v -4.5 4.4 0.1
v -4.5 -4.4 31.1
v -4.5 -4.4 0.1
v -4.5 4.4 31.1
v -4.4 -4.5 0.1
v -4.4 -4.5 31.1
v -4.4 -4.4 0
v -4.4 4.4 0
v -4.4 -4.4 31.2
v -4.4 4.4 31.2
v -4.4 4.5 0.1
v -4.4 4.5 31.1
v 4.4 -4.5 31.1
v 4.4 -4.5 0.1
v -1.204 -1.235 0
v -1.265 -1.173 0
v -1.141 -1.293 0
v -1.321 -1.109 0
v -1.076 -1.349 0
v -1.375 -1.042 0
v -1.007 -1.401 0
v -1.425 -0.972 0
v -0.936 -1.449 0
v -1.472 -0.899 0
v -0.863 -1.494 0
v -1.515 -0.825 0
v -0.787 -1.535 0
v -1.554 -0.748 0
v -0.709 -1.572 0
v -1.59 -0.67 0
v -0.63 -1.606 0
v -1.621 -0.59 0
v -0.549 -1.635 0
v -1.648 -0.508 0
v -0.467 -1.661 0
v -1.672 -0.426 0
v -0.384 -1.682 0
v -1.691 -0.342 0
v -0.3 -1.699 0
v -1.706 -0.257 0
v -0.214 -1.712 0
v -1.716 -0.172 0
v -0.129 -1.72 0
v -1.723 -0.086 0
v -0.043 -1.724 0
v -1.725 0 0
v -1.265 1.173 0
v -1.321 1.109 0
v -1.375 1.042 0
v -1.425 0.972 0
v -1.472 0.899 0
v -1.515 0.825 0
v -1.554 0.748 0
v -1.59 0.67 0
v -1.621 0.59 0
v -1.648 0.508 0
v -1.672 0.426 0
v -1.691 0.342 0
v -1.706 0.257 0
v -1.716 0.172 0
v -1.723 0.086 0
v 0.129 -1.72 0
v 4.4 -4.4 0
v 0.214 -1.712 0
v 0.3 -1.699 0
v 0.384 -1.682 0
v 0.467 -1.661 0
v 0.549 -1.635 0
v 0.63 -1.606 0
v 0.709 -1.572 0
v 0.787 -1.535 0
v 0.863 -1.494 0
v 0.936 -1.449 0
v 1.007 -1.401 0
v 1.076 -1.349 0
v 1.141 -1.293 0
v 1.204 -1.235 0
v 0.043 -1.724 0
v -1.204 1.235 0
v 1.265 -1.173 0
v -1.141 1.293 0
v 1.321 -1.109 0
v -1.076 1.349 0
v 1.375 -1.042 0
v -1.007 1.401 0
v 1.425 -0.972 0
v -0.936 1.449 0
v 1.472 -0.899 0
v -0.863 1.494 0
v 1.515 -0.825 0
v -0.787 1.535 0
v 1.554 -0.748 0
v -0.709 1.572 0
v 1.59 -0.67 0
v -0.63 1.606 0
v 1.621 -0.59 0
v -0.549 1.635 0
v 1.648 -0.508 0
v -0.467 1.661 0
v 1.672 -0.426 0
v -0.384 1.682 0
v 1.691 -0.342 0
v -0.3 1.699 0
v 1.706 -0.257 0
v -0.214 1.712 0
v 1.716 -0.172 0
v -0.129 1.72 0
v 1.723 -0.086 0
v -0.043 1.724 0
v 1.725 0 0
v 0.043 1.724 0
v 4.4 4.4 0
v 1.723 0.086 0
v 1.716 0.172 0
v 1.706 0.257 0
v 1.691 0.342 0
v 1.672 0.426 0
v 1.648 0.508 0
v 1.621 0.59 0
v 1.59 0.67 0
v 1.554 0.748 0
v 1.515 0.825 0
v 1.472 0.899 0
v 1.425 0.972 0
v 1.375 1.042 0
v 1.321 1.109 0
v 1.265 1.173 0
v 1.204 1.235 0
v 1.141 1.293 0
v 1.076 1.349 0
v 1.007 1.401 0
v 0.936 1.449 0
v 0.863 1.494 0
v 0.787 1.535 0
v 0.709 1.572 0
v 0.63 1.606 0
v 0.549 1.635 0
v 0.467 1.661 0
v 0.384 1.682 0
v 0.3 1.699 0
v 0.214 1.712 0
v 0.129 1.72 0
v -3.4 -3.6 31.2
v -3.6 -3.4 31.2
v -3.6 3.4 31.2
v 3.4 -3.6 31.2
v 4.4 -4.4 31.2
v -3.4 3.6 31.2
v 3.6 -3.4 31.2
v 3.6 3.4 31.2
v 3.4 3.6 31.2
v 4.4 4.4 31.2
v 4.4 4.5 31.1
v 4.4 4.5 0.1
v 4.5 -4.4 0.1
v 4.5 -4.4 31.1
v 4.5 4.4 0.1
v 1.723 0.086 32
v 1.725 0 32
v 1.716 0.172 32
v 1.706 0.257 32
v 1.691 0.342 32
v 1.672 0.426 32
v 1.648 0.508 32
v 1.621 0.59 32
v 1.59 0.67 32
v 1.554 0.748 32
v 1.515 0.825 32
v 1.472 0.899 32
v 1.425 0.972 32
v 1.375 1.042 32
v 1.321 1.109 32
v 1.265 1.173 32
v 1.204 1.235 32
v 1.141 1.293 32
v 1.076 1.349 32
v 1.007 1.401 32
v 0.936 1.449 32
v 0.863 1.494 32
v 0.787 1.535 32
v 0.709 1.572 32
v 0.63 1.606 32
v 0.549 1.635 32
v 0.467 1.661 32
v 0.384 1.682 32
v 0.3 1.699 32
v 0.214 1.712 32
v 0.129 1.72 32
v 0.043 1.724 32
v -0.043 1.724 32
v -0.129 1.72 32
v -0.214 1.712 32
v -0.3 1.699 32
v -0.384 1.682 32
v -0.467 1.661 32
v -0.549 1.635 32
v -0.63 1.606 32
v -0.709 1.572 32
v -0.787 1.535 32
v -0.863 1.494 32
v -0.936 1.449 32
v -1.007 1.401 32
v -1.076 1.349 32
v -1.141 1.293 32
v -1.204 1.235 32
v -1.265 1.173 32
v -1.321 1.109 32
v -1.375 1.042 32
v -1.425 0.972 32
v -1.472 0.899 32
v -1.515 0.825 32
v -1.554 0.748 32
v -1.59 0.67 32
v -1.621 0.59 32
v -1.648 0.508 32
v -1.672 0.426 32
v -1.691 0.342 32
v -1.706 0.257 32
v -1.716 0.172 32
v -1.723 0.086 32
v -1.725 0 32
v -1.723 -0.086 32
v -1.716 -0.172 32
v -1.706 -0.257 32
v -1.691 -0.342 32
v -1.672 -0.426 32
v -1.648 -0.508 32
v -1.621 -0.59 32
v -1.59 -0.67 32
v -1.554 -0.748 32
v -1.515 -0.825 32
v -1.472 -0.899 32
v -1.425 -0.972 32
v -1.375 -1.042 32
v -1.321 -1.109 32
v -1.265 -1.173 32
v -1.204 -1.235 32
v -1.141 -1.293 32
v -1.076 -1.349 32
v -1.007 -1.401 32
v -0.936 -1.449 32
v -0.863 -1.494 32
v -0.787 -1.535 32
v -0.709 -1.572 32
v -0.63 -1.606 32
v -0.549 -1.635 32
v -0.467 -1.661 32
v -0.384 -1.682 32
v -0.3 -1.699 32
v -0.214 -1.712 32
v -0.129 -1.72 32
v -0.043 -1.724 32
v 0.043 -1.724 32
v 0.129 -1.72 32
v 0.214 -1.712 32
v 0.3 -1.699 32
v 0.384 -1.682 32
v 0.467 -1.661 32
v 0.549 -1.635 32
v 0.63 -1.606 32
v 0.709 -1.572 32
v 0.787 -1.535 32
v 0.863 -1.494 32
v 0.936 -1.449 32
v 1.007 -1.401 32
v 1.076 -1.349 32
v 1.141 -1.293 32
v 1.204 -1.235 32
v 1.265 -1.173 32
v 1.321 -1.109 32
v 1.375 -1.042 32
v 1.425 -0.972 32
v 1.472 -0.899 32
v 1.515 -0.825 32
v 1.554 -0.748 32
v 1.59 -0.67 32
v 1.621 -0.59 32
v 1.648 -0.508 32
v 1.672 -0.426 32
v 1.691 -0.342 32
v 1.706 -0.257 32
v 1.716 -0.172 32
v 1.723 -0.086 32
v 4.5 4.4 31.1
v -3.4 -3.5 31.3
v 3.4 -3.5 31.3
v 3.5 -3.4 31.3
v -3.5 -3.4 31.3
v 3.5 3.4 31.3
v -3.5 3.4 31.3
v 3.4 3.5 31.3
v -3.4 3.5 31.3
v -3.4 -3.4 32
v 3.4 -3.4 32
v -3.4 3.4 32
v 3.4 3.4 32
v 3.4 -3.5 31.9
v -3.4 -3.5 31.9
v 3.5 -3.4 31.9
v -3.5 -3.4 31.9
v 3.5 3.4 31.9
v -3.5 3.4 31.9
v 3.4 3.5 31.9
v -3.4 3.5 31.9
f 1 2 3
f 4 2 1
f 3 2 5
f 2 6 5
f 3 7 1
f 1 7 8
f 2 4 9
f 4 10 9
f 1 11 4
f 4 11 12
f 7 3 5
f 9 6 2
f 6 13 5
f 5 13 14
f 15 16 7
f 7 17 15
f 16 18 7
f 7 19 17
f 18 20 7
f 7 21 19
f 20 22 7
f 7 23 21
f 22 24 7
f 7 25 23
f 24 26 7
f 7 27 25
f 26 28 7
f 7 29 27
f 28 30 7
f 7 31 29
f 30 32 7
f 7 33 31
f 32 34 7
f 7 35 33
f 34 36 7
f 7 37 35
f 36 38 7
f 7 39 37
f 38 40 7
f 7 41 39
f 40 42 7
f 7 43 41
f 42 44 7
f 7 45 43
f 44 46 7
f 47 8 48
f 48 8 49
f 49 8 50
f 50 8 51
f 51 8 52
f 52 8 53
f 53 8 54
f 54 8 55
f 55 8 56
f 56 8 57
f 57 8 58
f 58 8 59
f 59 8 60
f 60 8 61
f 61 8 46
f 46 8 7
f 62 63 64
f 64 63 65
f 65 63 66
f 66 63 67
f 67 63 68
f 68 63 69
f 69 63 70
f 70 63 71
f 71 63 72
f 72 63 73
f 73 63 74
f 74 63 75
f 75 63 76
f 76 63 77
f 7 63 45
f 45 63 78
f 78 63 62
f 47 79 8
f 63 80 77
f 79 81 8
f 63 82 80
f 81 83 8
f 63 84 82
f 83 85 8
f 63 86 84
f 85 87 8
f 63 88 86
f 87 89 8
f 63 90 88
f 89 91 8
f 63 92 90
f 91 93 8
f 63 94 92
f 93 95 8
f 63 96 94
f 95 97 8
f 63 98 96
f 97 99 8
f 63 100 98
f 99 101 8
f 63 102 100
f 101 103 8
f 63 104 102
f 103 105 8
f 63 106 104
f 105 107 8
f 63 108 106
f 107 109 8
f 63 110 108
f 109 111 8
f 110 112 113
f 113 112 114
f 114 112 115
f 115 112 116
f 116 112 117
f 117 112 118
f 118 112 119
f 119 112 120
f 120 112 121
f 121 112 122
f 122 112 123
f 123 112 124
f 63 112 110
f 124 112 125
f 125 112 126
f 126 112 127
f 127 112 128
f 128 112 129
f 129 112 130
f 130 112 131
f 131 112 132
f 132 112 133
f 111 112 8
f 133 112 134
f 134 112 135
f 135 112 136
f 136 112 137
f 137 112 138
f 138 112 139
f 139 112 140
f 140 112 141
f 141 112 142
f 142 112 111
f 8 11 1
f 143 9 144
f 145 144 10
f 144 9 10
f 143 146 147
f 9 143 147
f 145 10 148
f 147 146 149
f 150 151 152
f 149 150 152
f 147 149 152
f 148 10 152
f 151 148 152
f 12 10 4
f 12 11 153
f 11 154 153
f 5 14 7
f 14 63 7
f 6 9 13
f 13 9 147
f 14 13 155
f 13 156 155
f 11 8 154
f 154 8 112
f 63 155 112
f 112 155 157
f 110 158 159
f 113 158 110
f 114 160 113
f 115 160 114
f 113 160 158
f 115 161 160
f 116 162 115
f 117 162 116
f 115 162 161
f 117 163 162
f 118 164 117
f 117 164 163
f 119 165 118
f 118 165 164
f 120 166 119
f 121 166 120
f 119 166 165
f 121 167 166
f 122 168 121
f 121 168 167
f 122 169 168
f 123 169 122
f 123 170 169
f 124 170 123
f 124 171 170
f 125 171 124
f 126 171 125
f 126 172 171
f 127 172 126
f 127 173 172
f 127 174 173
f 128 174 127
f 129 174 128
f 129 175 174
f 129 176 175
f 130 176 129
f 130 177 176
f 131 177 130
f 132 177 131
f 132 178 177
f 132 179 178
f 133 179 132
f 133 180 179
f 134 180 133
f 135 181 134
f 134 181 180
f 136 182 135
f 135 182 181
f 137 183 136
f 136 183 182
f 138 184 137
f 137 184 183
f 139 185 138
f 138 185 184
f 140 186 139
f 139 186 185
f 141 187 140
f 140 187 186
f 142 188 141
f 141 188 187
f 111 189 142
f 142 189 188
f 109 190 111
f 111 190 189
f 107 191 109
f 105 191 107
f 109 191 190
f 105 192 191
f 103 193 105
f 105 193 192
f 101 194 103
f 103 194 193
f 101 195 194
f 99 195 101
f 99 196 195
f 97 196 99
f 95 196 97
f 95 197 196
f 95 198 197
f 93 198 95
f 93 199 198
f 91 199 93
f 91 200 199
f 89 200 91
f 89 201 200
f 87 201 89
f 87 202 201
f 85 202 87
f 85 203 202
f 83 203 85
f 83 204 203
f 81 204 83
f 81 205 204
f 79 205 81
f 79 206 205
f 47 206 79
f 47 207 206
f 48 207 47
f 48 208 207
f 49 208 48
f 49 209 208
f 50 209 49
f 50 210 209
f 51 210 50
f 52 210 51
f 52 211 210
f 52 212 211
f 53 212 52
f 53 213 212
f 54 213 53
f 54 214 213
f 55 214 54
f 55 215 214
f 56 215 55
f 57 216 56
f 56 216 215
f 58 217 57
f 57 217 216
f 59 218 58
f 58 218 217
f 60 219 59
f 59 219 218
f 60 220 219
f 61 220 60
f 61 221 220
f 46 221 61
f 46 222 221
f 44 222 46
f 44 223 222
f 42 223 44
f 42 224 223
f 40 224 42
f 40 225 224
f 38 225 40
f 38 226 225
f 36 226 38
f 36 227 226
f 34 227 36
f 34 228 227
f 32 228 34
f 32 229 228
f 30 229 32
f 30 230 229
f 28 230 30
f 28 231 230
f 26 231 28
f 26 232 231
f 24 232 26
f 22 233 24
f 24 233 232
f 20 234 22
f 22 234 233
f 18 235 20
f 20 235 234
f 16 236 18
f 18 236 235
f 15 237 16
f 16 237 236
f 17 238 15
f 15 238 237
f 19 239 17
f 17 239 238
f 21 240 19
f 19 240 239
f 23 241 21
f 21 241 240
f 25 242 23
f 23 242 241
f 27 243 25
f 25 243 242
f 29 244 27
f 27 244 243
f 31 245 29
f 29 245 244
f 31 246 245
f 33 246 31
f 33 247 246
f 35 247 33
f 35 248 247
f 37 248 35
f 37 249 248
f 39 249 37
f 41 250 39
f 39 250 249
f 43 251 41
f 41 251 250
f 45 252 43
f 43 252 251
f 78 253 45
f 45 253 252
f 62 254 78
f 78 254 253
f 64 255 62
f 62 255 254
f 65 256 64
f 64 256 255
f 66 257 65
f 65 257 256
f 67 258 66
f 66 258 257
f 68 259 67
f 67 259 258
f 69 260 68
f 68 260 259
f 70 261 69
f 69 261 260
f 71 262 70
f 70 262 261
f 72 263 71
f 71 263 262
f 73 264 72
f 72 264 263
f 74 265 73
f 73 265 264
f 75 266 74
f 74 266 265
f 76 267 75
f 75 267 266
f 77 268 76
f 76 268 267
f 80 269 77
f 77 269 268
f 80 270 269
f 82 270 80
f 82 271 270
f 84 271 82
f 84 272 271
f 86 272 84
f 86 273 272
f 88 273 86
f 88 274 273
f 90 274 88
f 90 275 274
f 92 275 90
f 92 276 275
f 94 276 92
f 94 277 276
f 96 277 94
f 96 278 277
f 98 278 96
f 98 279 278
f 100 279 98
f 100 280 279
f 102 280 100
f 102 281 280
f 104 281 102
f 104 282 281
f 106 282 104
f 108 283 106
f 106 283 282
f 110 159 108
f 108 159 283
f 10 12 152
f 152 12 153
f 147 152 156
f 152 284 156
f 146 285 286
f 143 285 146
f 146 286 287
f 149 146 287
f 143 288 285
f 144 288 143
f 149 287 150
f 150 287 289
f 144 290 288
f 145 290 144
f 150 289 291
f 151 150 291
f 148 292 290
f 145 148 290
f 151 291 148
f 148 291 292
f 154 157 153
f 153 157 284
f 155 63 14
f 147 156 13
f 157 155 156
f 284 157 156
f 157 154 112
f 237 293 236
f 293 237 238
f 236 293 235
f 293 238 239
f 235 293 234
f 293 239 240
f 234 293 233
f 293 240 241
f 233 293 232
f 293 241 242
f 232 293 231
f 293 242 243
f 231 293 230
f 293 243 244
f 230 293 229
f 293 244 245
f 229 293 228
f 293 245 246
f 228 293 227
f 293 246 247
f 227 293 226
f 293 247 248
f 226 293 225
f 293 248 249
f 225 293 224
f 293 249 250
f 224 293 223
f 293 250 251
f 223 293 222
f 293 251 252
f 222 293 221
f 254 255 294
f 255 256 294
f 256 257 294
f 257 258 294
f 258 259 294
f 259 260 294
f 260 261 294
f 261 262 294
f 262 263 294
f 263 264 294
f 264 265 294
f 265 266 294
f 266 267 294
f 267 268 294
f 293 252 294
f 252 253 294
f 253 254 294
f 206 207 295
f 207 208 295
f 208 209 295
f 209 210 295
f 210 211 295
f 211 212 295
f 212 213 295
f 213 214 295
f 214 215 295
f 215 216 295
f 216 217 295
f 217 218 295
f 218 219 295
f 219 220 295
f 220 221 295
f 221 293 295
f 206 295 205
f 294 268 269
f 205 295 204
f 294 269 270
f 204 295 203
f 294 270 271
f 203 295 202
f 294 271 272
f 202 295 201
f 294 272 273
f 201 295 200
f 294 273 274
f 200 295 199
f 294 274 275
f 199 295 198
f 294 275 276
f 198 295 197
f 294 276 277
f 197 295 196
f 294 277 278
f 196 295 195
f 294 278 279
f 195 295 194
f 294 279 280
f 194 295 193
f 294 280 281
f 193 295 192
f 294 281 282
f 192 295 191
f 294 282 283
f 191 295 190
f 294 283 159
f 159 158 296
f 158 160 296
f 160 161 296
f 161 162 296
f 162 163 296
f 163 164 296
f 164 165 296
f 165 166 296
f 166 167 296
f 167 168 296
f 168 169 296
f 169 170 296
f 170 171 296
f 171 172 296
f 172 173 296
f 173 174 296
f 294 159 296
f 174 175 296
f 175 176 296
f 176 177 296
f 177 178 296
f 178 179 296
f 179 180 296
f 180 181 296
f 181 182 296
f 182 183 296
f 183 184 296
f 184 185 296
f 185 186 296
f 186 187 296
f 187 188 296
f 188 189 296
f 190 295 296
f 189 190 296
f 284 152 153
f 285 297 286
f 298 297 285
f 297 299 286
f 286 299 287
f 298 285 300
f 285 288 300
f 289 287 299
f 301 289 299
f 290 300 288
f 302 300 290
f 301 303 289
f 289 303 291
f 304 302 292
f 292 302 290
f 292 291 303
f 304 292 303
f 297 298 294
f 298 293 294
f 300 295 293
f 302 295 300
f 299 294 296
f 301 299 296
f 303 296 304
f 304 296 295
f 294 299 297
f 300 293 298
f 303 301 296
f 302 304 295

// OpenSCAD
// Generated by spec/build_parent_gnss.py; dimensions and edge finishing are parametric there.
polyhedron(points=[[-4.5, -4.400000095367432, 0.10000000149011612], [-4.5, -4.400000095367432, 31.100000381469727], [-4.5, 4.400000095367432, 0.10000000149011612], [-4.5, 4.400000095367432, 31.100000381469727], [-4.400000095367432, -4.5, 0.10000000149011612], [-4.400000095367432, -4.5, 31.100000381469727], [-4.400000095367432, -4.400000095367432, 3.2612801348363973e-16], [-4.400000095367432, 4.400000095367432, 3.2612801348363973e-16], [-4.400000095367432, -4.400000095367432, 31.200000762939453], [-4.400000095367432, 4.400000095367432, 31.200000762939453], [-4.400000095367432, 4.5, 0.10000000149011612], [-4.400000095367432, 4.5, 31.100000381469727], [4.400000095367432, -4.5, 31.100000381469727], [4.400000095367432, -4.5, 0.10000000149011612], [-1.264514446258545, -1.1732980012893677, 0.0], [-1.204458475112915, -1.2348703145980835, 0.0], [-1.141408085823059, -1.293372631072998, 0.0], [-1.3214266300201416, -1.1088086366653442, 0.0], [-1.0755199193954468, -1.3486592769622803, 0.0], [-1.3750535249710083, -1.041562557220459, 0.0], [-1.0069578886032104, -1.4005930423736572, 0.0], [-1.4252618551254272, -0.9717270731925964, 0.0], [-0.9358922839164734, -1.4490447044372559, 0.0], [-1.4719268083572388, -0.8994757533073425, 0.0], [-0.862500011920929, -1.4938938617706299, 0.0], [-1.5149321556091309, -0.8249881267547607, 0.0], [-0.7869634032249451, -1.5350288152694702, 0.0], [-1.5541713237762451, -0.748449444770813, 0.0], [-0.709470272064209, -1.572347640991211, 0.0], [-1.5895464420318604, -0.6700500249862671, 0.0], [-0.6302132606506348, -1.605757236480713, 0.0], [-1.6209697723388672, -0.5899847745895386, 0.0], [-0.5493894815444946, -1.6351746320724487, 0.0], [-1.6483631134033203, -0.5084526538848877, 0.0], [-0.46719980239868164, -1.6605268716812134, 0.0], [-1.6716582775115967, -0.4256564974784851, 0.0], [-0.3838486075401306, -1.6817506551742554, 0.0], [-1.6907975673675537, -0.34180209040641785, 0.0], [-0.2995431125164032, -1.6987934112548828, 0.0], [-1.7057331800460815, -0.25709789991378784, 0.0], [-0.21449288725852966, -1.711612582206726, 0.0], [-1.7164280414581299, -0.17175453901290894, 0.0], [-0.1289094090461731, -1.7201765775680542, 0.0], [-1.7228556871414185, -0.08598415553569794, 0.0], [-0.04300544410943985, -1.7244638204574585, 0.0], [-1.725000023841858, -5.917179469523042e-15, 0.0], [-1.3214266300201416, 1.1088086366653442, 0.0], [-1.264514446258545, 1.1732980012893677, 0.0], [-1.3750535249710083, 1.041562557220459, 0.0], [-1.4252618551254272, 0.9717270731925964, 0.0], [-1.4719268083572388, 0.8994757533073425, 0.0], [-1.5149321556091309, 0.8249881267547607, 0.0], [-1.5541713237762451, 0.748449444770813, 0.0], [-1.5895464420318604, 0.6700500249862671, 0.0], [-1.6209697723388672, 0.5899847745895386, 0.0], [-1.6483631134033203, 0.5084526538848877, 0.0], [-1.6716582775115967, 0.4256564974784851, 0.0], [-1.6907975673675537, 0.34180209040641785, 0.0], [-1.7057331800460815, 0.25709789991378784, 0.0], [-1.7164280414581299, 0.17175453901290894, 0.0], [-1.7228556871414185, 0.08598415553569794, 0.0], [0.21449288725852966, -1.711612582206726, 0.0], [4.400000095367432, -4.400000095367432, 3.2612801348363973e-16], [0.1289094090461731, -1.7201765775680542, 0.0], [0.2995431125164032, -1.6987934112548828, 0.0], [0.3838486075401306, -1.6817506551742554, 0.0], [0.46719980239868164, -1.6605268716812134, 0.0], [0.5493894815444946, -1.6351746320724487, 0.0], [0.6302132606506348, -1.605757236480713, 0.0], [0.709470272064209, -1.572347640991211, 0.0], [0.7869634032249451, -1.5350288152694702, 0.0], [0.862500011920929, -1.4938938617706299, 0.0], [0.9358922839164734, -1.4490447044372559, 0.0], [1.0069578886032104, -1.4005930423736572, 0.0], [1.0755199193954468, -1.3486592769622803, 0.0], [1.141408085823059, -1.293372631072998, 0.0], [1.204458475112915, -1.2348703145980835, 0.0], [0.04300544410943985, -1.7244638204574585, 0.0], [-1.204458475112915, 1.2348703145980835, 0.0], [1.264514446258545, -1.1732980012893677, 0.0], [-1.141408085823059, 1.293372631072998, 0.0], [1.3214266300201416, -1.1088086366653442, 0.0], [-1.0755199193954468, 1.3486592769622803, 0.0], [1.3750535249710083, -1.041562557220459, 0.0], [-1.0069578886032104, 1.4005930423736572, 0.0], [1.4252618551254272, -0.9717270731925964, 0.0], [-0.9358922839164734, 1.4490447044372559, 0.0], [1.4719268083572388, -0.8994757533073425, 0.0], [-0.862500011920929, 1.4938938617706299, 0.0], [1.5149321556091309, -0.8249881267547607, 0.0], [-0.7869634032249451, 1.5350288152694702, 0.0], [1.5541713237762451, -0.748449444770813, 0.0], [-0.709470272064209, 1.572347640991211, 0.0], [1.5895464420318604, -0.6700500249862671, 0.0], [-0.6302132606506348, 1.605757236480713, 0.0], [1.6209697723388672, -0.5899847745895386, 0.0], [-0.5493894815444946, 1.6351746320724487, 0.0], [1.6483631134033203, -0.5084526538848877, 0.0], [-0.46719980239868164, 1.6605268716812134, 0.0], [1.6716582775115967, -0.4256564974784851, 0.0], [-0.3838486075401306, 1.6817506551742554, 0.0], [1.6907975673675537, -0.34180209040641785, 0.0], [-0.2995431125164032, 1.6987934112548828, 0.0], [1.7057331800460815, -0.25709789991378784, 0.0], [-0.21449288725852966, 1.711612582206726, 0.0], [1.7164280414581299, -0.17175453901290894, 0.0], [-0.1289094090461731, 1.7201765775680542, 0.0], [1.7228556871414185, -0.08598415553569794, 0.0], [-0.04300544410943985, 1.7244638204574585, 0.0], [1.725000023841858, -4.22503157524438e-16, 0.0], [0.04300544410943985, 1.7244638204574585, 0.0], [1.7228556871414185, 0.08598415553569794, 0.0], [4.400000095367432, 4.400000095367432, 3.2612801348363973e-16], [1.7164280414581299, 0.17175453901290894, 0.0], [1.7057331800460815, 0.25709789991378784, 0.0], [1.6907975673675537, 0.34180209040641785, 0.0], [1.6716582775115967, 0.4256564974784851, 0.0], [1.6483631134033203, 0.5084526538848877, 0.0], [1.6209697723388672, 0.5899847745895386, 0.0], [1.5895464420318604, 0.6700500249862671, 0.0], [1.5541713237762451, 0.748449444770813, 0.0], [1.5149321556091309, 0.8249881267547607, 0.0], [1.4719268083572388, 0.8994757533073425, 0.0], [1.4252618551254272, 0.9717270731925964, 0.0], [1.3750535249710083, 1.041562557220459, 0.0], [1.3214266300201416, 1.1088086366653442, 0.0], [1.264514446258545, 1.1732980012893677, 0.0], [1.204458475112915, 1.2348703145980835, 0.0], [1.141408085823059, 1.293372631072998, 0.0], [1.0755199193954468, 1.3486592769622803, 0.0], [1.0069578886032104, 1.4005930423736572, 0.0], [0.9358922839164734, 1.4490447044372559, 0.0], [0.862500011920929, 1.4938938617706299, 0.0], [0.7869634032249451, 1.5350288152694702, 0.0], [0.709470272064209, 1.572347640991211, 0.0], [0.6302132606506348, 1.605757236480713, 0.0], [0.5493894815444946, 1.6351746320724487, 0.0], [0.46719980239868164, 1.6605268716812134, 0.0], [0.3838486075401306, 1.6817506551742554, 0.0], [0.2995431125164032, 1.6987934112548828, 0.0], [0.21449288725852966, 1.711612582206726, 0.0], [0.1289094090461731, 1.7201765775680542, 0.0], [-3.5999999046325684, -3.4000000953674316, 31.200000762939453], [-3.4000000953674316, -3.5999999046325684, 31.200000762939453], [-3.5999999046325684, 3.4000000953674316, 31.200000762939453], [4.400000095367432, -4.400000095367432, 31.200000762939453], [3.4000000953674316, -3.5999999046325684, 31.200000762939453], [-3.4000000953674316, 3.5999999046325684, 31.200000762939453], [3.5999999046325684, -3.4000000953674316, 31.200000762939453], [4.400000095367432, 4.400000095367432, 31.200000762939453], [3.4000000953674316, 3.5999999046325684, 31.200000762939453], [3.5999999046325684, 3.4000000953674316, 31.200000762939453], [4.400000095367432, 4.5, 31.100000381469727], [4.400000095367432, 4.5, 0.10000000149011612], [4.5, -4.400000095367432, 0.10000000149011612], [4.5, -4.400000095367432, 31.100000381469727], [4.5, 4.400000095367432, 0.10000000149011612], [1.725000023841858, -4.22503157524438e-16, 32.0], [1.7228556871414185, 0.08598415553569794, 32.0], [1.7164280414581299, 0.17175453901290894, 32.0], [1.7057331800460815, 0.25709789991378784, 32.0], [1.6907975673675537, 0.34180209040641785, 32.0], [1.6716582775115967, 0.4256564974784851, 32.0], [1.6483631134033203, 0.5084526538848877, 32.0], [1.6209697723388672, 0.5899847745895386, 32.0], [1.5895464420318604, 0.6700500249862671, 32.0], [1.5541713237762451, 0.748449444770813, 32.0], [1.5149321556091309, 0.8249881267547607, 32.0], [1.4719268083572388, 0.8994757533073425, 32.0], [1.4252618551254272, 0.9717270731925964, 32.0], [1.3750535249710083, 1.041562557220459, 32.0], [1.3214266300201416, 1.1088086366653442, 32.0], [1.264514446258545, 1.1732980012893677, 32.0], [1.204458475112915, 1.2348703145980835, 32.0], [1.141408085823059, 1.293372631072998, 32.0], [1.0755199193954468, 1.3486592769622803, 32.0], [1.0069578886032104, 1.4005930423736572, 32.0], [0.9358922839164734, 1.4490447044372559, 32.0], [0.862500011920929, 1.4938938617706299, 32.0], [0.7869634032249451, 1.5350288152694702, 32.0], [0.709470272064209, 1.572347640991211, 32.0], [0.6302132606506348, 1.605757236480713, 32.0], [0.5493894815444946, 1.6351746320724487, 32.0], [0.46719980239868164, 1.6605268716812134, 32.0], [0.3838486075401306, 1.6817506551742554, 32.0], [0.2995431125164032, 1.6987934112548828, 32.0], [0.21449288725852966, 1.711612582206726, 32.0], [0.1289094090461731, 1.7201765775680542, 32.0], [0.04300544410943985, 1.7244638204574585, 32.0], [-0.04300544410943985, 1.7244638204574585, 32.0], [-0.1289094090461731, 1.7201765775680542, 32.0], [-0.21449288725852966, 1.711612582206726, 32.0], [-0.2995431125164032, 1.6987934112548828, 32.0], [-0.3838486075401306, 1.6817506551742554, 32.0], [-0.46719980239868164, 1.6605268716812134, 32.0], [-0.5493894815444946, 1.6351746320724487, 32.0], [-0.6302132606506348, 1.605757236480713, 32.0], [-0.709470272064209, 1.572347640991211, 32.0], [-0.7869634032249451, 1.5350288152694702, 32.0], [-0.862500011920929, 1.4938938617706299, 32.0], [-0.9358922839164734, 1.4490447044372559, 32.0], [-1.0069578886032104, 1.4005930423736572, 32.0], [-1.0755199193954468, 1.3486592769622803, 32.0], [-1.141408085823059, 1.293372631072998, 32.0], [-1.204458475112915, 1.2348703145980835, 32.0], [-1.264514446258545, 1.1732980012893677, 32.0], [-1.3214266300201416, 1.1088086366653442, 32.0], [-1.3750535249710083, 1.041562557220459, 32.0], [-1.4252618551254272, 0.9717270731925964, 32.0], [-1.4719268083572388, 0.8994757533073425, 32.0], [-1.5149321556091309, 0.8249881267547607, 32.0], [-1.5541713237762451, 0.748449444770813, 32.0], [-1.5895464420318604, 0.6700500249862671, 32.0], [-1.6209697723388672, 0.5899847745895386, 32.0], [-1.6483631134033203, 0.5084526538848877, 32.0], [-1.6716582775115967, 0.4256564974784851, 32.0], [-1.6907975673675537, 0.34180209040641785, 32.0], [-1.7057331800460815, 0.25709789991378784, 32.0], [-1.7164280414581299, 0.17175453901290894, 32.0], [-1.7228556871414185, 0.08598415553569794, 32.0], [-1.725000023841858, -5.917179469523042e-15, 32.0], [-1.7228556871414185, -0.08598415553569794, 32.0], [-1.7164280414581299, -0.17175453901290894, 32.0], [-1.7057331800460815, -0.25709789991378784, 32.0], [-1.6907975673675537, -0.34180209040641785, 32.0], [-1.6716582775115967, -0.4256564974784851, 32.0], [-1.6483631134033203, -0.5084526538848877, 32.0], [-1.6209697723388672, -0.5899847745895386, 32.0], [-1.5895464420318604, -0.6700500249862671, 32.0], [-1.5541713237762451, -0.748449444770813, 32.0], [-1.5149321556091309, -0.8249881267547607, 32.0], [-1.4719268083572388, -0.8994757533073425, 32.0], [-1.4252618551254272, -0.9717270731925964, 32.0], [-1.3750535249710083, -1.041562557220459, 32.0], [-1.3214266300201416, -1.1088086366653442, 32.0], [-1.264514446258545, -1.1732980012893677, 32.0], [-1.204458475112915, -1.2348703145980835, 32.0], [-1.141408085823059, -1.293372631072998, 32.0], [-1.0755199193954468, -1.3486592769622803, 32.0], [-1.0069578886032104, -1.4005930423736572, 32.0], [-0.9358922839164734, -1.4490447044372559, 32.0], [-0.862500011920929, -1.4938938617706299, 32.0], [-0.7869634032249451, -1.5350288152694702, 32.0], [-0.709470272064209, -1.572347640991211, 32.0], [-0.6302132606506348, -1.605757236480713, 32.0], [-0.5493894815444946, -1.6351746320724487, 32.0], [-0.46719980239868164, -1.6605268716812134, 32.0], [-0.3838486075401306, -1.6817506551742554, 32.0], [-0.2995431125164032, -1.6987934112548828, 32.0], [-0.21449288725852966, -1.711612582206726, 32.0], [-0.1289094090461731, -1.7201765775680542, 32.0], [-0.04300544410943985, -1.7244638204574585, 32.0], [0.04300544410943985, -1.7244638204574585, 32.0], [0.1289094090461731, -1.7201765775680542, 32.0], [0.21449288725852966, -1.711612582206726, 32.0], [0.2995431125164032, -1.6987934112548828, 32.0], [0.3838486075401306, -1.6817506551742554, 32.0], [0.46719980239868164, -1.6605268716812134, 32.0], [0.5493894815444946, -1.6351746320724487, 32.0], [0.6302132606506348, -1.605757236480713, 32.0], [0.709470272064209, -1.572347640991211, 32.0], [0.7869634032249451, -1.5350288152694702, 32.0], [0.862500011920929, -1.4938938617706299, 32.0], [0.9358922839164734, -1.4490447044372559, 32.0], [1.0069578886032104, -1.4005930423736572, 32.0], [1.0755199193954468, -1.3486592769622803, 32.0], [1.141408085823059, -1.293372631072998, 32.0], [1.204458475112915, -1.2348703145980835, 32.0], [1.264514446258545, -1.1732980012893677, 32.0], [1.3214266300201416, -1.1088086366653442, 32.0], [1.3750535249710083, -1.041562557220459, 32.0], [1.4252618551254272, -0.9717270731925964, 32.0], [1.4719268083572388, -0.8994757533073425, 32.0], [1.5149321556091309, -0.8249881267547607, 32.0], [1.5541713237762451, -0.748449444770813, 32.0], [1.5895464420318604, -0.6700500249862671, 32.0], [1.6209697723388672, -0.5899847745895386, 32.0], [1.6483631134033203, -0.5084526538848877, 32.0], [1.6716582775115967, -0.4256564974784851, 32.0], [1.6907975673675537, -0.34180209040641785, 32.0], [1.7057331800460815, -0.25709789991378784, 32.0], [1.7164280414581299, -0.17175453901290894, 32.0], [1.7228556871414185, -0.08598415553569794, 32.0], [4.5, 4.400000095367432, 31.100000381469727], [3.4000000953674316, -3.5, 31.299999237060547], [-3.4000000953674316, -3.5, 31.299999237060547], [3.5, -3.4000000953674316, 31.299999237060547], [-3.5, -3.4000000953674316, 31.299999237060547], [3.5, 3.4000000953674316, 31.299999237060547], [-3.5, 3.4000000953674316, 31.299999237060547], [3.4000000953674316, 3.5, 31.299999237060547], [-3.4000000953674316, 3.5, 31.299999237060547], [-3.4000000953674316, -3.4000000953674316, 32.0], [3.4000000953674316, -3.4000000953674316, 32.0], [-3.4000000953674316, 3.4000000953674316, 32.0], [3.4000000953674316, 3.4000000953674316, 32.0], [3.4000000953674316, -3.5, 31.899999618530273], [-3.4000000953674316, -3.5, 31.899999618530273], [3.5, -3.4000000953674316, 31.899999618530273], [-3.5, -3.4000000953674316, 31.899999618530273], [3.5, 3.4000000953674316, 31.899999618530273], [-3.5, 3.4000000953674316, 31.899999618530273], [3.4000000953674316, 3.5, 31.899999618530273], [-3.4000000953674316, 3.5, 31.899999618530273]],faces=[[0, 1, 2], [2, 1, 3], [4, 1, 0], [4, 5, 1], [2, 6, 0], [7, 6, 2], [8, 3, 1], [8, 9, 3], [3, 10, 2], [11, 10, 3], [4, 0, 6], [1, 5, 8], [4, 12, 5], [13, 12, 4], [6, 14, 15], [15, 16, 6], [6, 17, 14], [16, 18, 6], [6, 19, 17], [18, 20, 6], [6, 21, 19], [20, 22, 6], [6, 23, 21], [22, 24, 6], [6, 25, 23], [24, 26, 6], [6, 27, 25], [26, 28, 6], [6, 29, 27], [28, 30, 6], [6, 31, 29], [30, 32, 6], [6, 33, 31], [32, 34, 6], [6, 35, 33], [34, 36, 6], [6, 37, 35], [36, 38, 6], [6, 39, 37], [38, 40, 6], [6, 41, 39], [40, 42, 6], [6, 43, 41], [42, 44, 6], [6, 45, 43], [46, 7, 47], [48, 7, 46], [49, 7, 48], [50, 7, 49], [51, 7, 50], [52, 7, 51], [53, 7, 52], [54, 7, 53], [55, 7, 54], [56, 7, 55], [57, 7, 56], [58, 7, 57], [59, 7, 58], [60, 7, 59], [45, 7, 60], [6, 7, 45], [61, 62, 63], [64, 62, 61], [65, 62, 64], [66, 62, 65], [67, 62, 66], [68, 62, 67], [69, 62, 68], [70, 62, 69], [71, 62, 70], [72, 62, 71], [73, 62, 72], [74, 62, 73], [75, 62, 74], [76, 62, 75], [44, 62, 6], [77, 62, 44], [63, 62, 77], [7, 78, 47], [76, 79, 62], [7, 80, 78], [79, 81, 62], [7, 82, 80], [81, 83, 62], [7, 84, 82], [83, 85, 62], [7, 86, 84], [85, 87, 62], [7, 88, 86], [87, 89, 62], [7, 90, 88], [89, 91, 62], [7, 92, 90], [91, 93, 62], [7, 94, 92], [93, 95, 62], [7, 96, 94], [95, 97, 62], [7, 98, 96], [97, 99, 62], [7, 100, 98], [99, 101, 62], [7, 102, 100], [101, 103, 62], [7, 104, 102], [103, 105, 62], [7, 106, 104], [105, 107, 62], [7, 108, 106], [107, 109, 62], [7, 110, 108], [111, 112, 109], [113, 112, 111], [114, 112, 113], [115, 112, 114], [116, 112, 115], [117, 112, 116], [118, 112, 117], [119, 112, 118], [120, 112, 119], [121, 112, 120], [122, 112, 121], [123, 112, 122], [109, 112, 62], [124, 112, 123], [125, 112, 124], [126, 112, 125], [127, 112, 126], [128, 112, 127], [129, 112, 128], [130, 112, 129], [131, 112, 130], [132, 112, 131], [7, 112, 110], [133, 112, 132], [134, 112, 133], [135, 112, 134], [136, 112, 135], [137, 112, 136], [138, 112, 137], [139, 112, 138], [140, 112, 139], [141, 112, 140], [110, 112, 141], [2, 10, 7], [142, 8, 143], [9, 142, 144], [9, 8, 142], [145, 146, 143], [145, 143, 8], [147, 9, 144], [148, 146, 145], [149, 150, 151], [149, 151, 148], [149, 148, 145], [149, 9, 147], [149, 147, 150], [3, 9, 11], [152, 10, 11], [152, 153, 10], [6, 13, 4], [6, 62, 13], [12, 8, 5], [145, 8, 12], [154, 12, 13], [154, 155, 12], [153, 7, 10], [112, 7, 153], [112, 154, 62], [156, 154, 112], [157, 158, 109], [109, 158, 111], [111, 159, 113], [113, 159, 114], [158, 159, 111], [159, 160, 114], [114, 161, 115], [115, 161, 116], [160, 161, 114], [161, 162, 116], [116, 163, 117], [162, 163, 116], [117, 164, 118], [163, 164, 117], [118, 165, 119], [119, 165, 120], [164, 165, 118], [165, 166, 120], [120, 167, 121], [166, 167, 120], [167, 168, 121], [121, 168, 122], [168, 169, 122], [122, 169, 123], [169, 170, 123], [123, 170, 124], [124, 170, 125], [170, 171, 125], [125, 171, 126], [171, 172, 126], [172, 173, 126], [126, 173, 127], [127, 173, 128], [173, 174, 128], [174, 175, 128], [128, 175, 129], [175, 176, 129], [129, 176, 130], [130, 176, 131], [176, 177, 131], [177, 178, 131], [131, 178, 132], [178, 179, 132], [132, 179, 133], [133, 180, 134], [179, 180, 133], [134, 181, 135], [180, 181, 134], [135, 182, 136], [181, 182, 135], [136, 183, 137], [182, 183, 136], [137, 184, 138], [183, 184, 137], [138, 185, 139], [184, 185, 138], [139, 186, 140], [185, 186, 139], [140, 187, 141], [186, 187, 140], [141, 188, 110], [187, 188, 141], [110, 189, 108], [188, 189, 110], [108, 190, 106], [106, 190, 104], [189, 190, 108], [190, 191, 104], [104, 192, 102], [191, 192, 104], [102, 193, 100], [192, 193, 102], [193, 194, 100], [100, 194, 98], [194, 195, 98], [98, 195, 96], [96, 195, 94], [195, 196, 94], [196, 197, 94], [94, 197, 92], [197, 198, 92], [92, 198, 90], [198, 199, 90], [90, 199, 88], [199, 200, 88], [88, 200, 86], [200, 201, 86], [86, 201, 84], [201, 202, 84], [84, 202, 82], [202, 203, 82], [82, 203, 80], [203, 204, 80], [80, 204, 78], [204, 205, 78], [78, 205, 47], [205, 206, 47], [47, 206, 46], [206, 207, 46], [46, 207, 48], [207, 208, 48], [48, 208, 49], [208, 209, 49], [49, 209, 50], [50, 209, 51], [209, 210, 51], [210, 211, 51], [51, 211, 52], [211, 212, 52], [52, 212, 53], [212, 213, 53], [53, 213, 54], [213, 214, 54], [54, 214, 55], [55, 215, 56], [214, 215, 55], [56, 216, 57], [215, 216, 56], [57, 217, 58], [216, 217, 57], [58, 218, 59], [217, 218, 58], [218, 219, 59], [59, 219, 60], [219, 220, 60], [60, 220, 45], [220, 221, 45], [45, 221, 43], [221, 222, 43], [43, 222, 41], [222, 223, 41], [41, 223, 39], [223, 224, 39], [39, 224, 37], [224, 225, 37], [37, 225, 35], [225, 226, 35], [35, 226, 33], [226, 227, 33], [33, 227, 31], [227, 228, 31], [31, 228, 29], [228, 229, 29], [29, 229, 27], [229, 230, 27], [27, 230, 25], [230, 231, 25], [25, 231, 23], [23, 232, 21], [231, 232, 23], [21, 233, 19], [232, 233, 21], [19, 234, 17], [233, 234, 19], [17, 235, 14], [234, 235, 17], [14, 236, 15], [235, 236, 14], [15, 237, 16], [236, 237, 15], [16, 238, 18], [237, 238, 16], [18, 239, 20], [238, 239, 18], [20, 240, 22], [239, 240, 20], [22, 241, 24], [240, 241, 22], [24, 242, 26], [241, 242, 24], [26, 243, 28], [242, 243, 26], [28, 244, 30], [243, 244, 28], [244, 245, 30], [30, 245, 32], [245, 246, 32], [32, 246, 34], [246, 247, 34], [34, 247, 36], [247, 248, 36], [36, 248, 38], [38, 249, 40], [248, 249, 38], [40, 250, 42], [249, 250, 40], [42, 251, 44], [250, 251, 42], [44, 252, 77], [251, 252, 44], [77, 253, 63], [252, 253, 77], [63, 254, 61], [253, 254, 63], [61, 255, 64], [254, 255, 61], [64, 256, 65], [255, 256, 64], [65, 257, 66], [256, 257, 65], [66, 258, 67], [257, 258, 66], [67, 259, 68], [258, 259, 67], [68, 260, 69], [259, 260, 68], [69, 261, 70], [260, 261, 69], [70, 262, 71], [261, 262, 70], [71, 263, 72], [262, 263, 71], [72, 264, 73], [263, 264, 72], [73, 265, 74], [264, 265, 73], [74, 266, 75], [265, 266, 74], [75, 267, 76], [266, 267, 75], [76, 268, 79], [267, 268, 76], [268, 269, 79], [79, 269, 81], [269, 270, 81], [81, 270, 83], [270, 271, 83], [83, 271, 85], [271, 272, 85], [85, 272, 87], [272, 273, 87], [87, 273, 89], [273, 274, 89], [89, 274, 91], [274, 275, 91], [91, 275, 93], [275, 276, 93], [93, 276, 95], [276, 277, 95], [95, 277, 97], [277, 278, 97], [97, 278, 99], [278, 279, 99], [99, 279, 101], [279, 280, 101], [101, 280, 103], [280, 281, 103], [103, 281, 105], [105, 282, 107], [281, 282, 105], [107, 157, 109], [282, 157, 107], [149, 11, 9], [152, 11, 149], [155, 149, 145], [155, 283, 149], [284, 285, 146], [146, 285, 143], [286, 284, 146], [286, 146, 148], [285, 287, 143], [143, 287, 142], [151, 286, 148], [288, 286, 151], [287, 289, 142], [142, 289, 144], [290, 288, 151], [290, 151, 150], [289, 291, 147], [289, 147, 144], [147, 290, 150], [291, 290, 147], [152, 156, 153], [283, 156, 152], [13, 62, 154], [12, 155, 145], [155, 154, 156], [155, 156, 283], [112, 153, 156], [235, 292, 236], [237, 236, 292], [234, 292, 235], [238, 237, 292], [233, 292, 234], [239, 238, 292], [232, 292, 233], [240, 239, 292], [231, 292, 232], [241, 240, 292], [230, 292, 231], [242, 241, 292], [229, 292, 230], [243, 242, 292], [228, 292, 229], [244, 243, 292], [227, 292, 228], [245, 244, 292], [226, 292, 227], [246, 245, 292], [225, 292, 226], [247, 246, 292], [224, 292, 225], [248, 247, 292], [223, 292, 224], [249, 248, 292], [222, 292, 223], [250, 249, 292], [221, 292, 222], [251, 250, 292], [220, 292, 221], [293, 254, 253], [293, 255, 254], [293, 256, 255], [293, 257, 256], [293, 258, 257], [293, 259, 258], [293, 260, 259], [293, 261, 260], [293, 262, 261], [293, 263, 262], [293, 264, 263], [293, 265, 264], [293, 266, 265], [293, 267, 266], [293, 251, 292], [293, 252, 251], [293, 253, 252], [294, 206, 205], [294, 207, 206], [294, 208, 207], [294, 209, 208], [294, 210, 209], [294, 211, 210], [294, 212, 211], [294, 213, 212], [294, 214, 213], [294, 215, 214], [294, 216, 215], [294, 217, 216], [294, 218, 217], [294, 219, 218], [294, 220, 219], [294, 292, 220], [204, 294, 205], [268, 267, 293], [203, 294, 204], [269, 268, 293], [202, 294, 203], [270, 269, 293], [201, 294, 202], [271, 270, 293], [200, 294, 201], [272, 271, 293], [199, 294, 200], [273, 272, 293], [198, 294, 199], [274, 273, 293], [197, 294, 198], [275, 274, 293], [196, 294, 197], [276, 275, 293], [195, 294, 196], [277, 276, 293], [194, 294, 195], [278, 277, 293], [193, 294, 194], [279, 278, 293], [192, 294, 193], [280, 279, 293], [191, 294, 192], [281, 280, 293], [190, 294, 191], [282, 281, 293], [189, 294, 190], [157, 282, 293], [295, 158, 157], [295, 159, 158], [295, 160, 159], [295, 161, 160], [295, 162, 161], [295, 163, 162], [295, 164, 163], [295, 165, 164], [295, 166, 165], [295, 167, 166], [295, 168, 167], [295, 169, 168], [295, 170, 169], [295, 171, 170], [295, 172, 171], [295, 173, 172], [295, 157, 293], [295, 174, 173], [295, 175, 174], [295, 176, 175], [295, 177, 176], [295, 178, 177], [295, 179, 178], [295, 180, 179], [295, 181, 180], [295, 182, 181], [295, 183, 182], [295, 184, 183], [295, 185, 184], [295, 186, 185], [295, 187, 186], [295, 188, 187], [295, 294, 189], [295, 189, 188], [152, 149, 283], [284, 296, 285], [285, 296, 297], [284, 298, 296], [286, 298, 284], [299, 285, 297], [299, 287, 285], [298, 286, 288], [298, 288, 300], [287, 299, 289], [289, 299, 301], [288, 302, 300], [290, 302, 288], [291, 301, 303], [289, 301, 291], [302, 290, 291], [302, 291, 303], [293, 297, 296], [293, 292, 297], [292, 294, 299], [299, 294, 301], [295, 293, 298], [295, 298, 300], [303, 295, 302], [294, 295, 303], [296, 298, 293], [297, 292, 299], [295, 300, 302], [294, 303, 301]],convexity=10);
